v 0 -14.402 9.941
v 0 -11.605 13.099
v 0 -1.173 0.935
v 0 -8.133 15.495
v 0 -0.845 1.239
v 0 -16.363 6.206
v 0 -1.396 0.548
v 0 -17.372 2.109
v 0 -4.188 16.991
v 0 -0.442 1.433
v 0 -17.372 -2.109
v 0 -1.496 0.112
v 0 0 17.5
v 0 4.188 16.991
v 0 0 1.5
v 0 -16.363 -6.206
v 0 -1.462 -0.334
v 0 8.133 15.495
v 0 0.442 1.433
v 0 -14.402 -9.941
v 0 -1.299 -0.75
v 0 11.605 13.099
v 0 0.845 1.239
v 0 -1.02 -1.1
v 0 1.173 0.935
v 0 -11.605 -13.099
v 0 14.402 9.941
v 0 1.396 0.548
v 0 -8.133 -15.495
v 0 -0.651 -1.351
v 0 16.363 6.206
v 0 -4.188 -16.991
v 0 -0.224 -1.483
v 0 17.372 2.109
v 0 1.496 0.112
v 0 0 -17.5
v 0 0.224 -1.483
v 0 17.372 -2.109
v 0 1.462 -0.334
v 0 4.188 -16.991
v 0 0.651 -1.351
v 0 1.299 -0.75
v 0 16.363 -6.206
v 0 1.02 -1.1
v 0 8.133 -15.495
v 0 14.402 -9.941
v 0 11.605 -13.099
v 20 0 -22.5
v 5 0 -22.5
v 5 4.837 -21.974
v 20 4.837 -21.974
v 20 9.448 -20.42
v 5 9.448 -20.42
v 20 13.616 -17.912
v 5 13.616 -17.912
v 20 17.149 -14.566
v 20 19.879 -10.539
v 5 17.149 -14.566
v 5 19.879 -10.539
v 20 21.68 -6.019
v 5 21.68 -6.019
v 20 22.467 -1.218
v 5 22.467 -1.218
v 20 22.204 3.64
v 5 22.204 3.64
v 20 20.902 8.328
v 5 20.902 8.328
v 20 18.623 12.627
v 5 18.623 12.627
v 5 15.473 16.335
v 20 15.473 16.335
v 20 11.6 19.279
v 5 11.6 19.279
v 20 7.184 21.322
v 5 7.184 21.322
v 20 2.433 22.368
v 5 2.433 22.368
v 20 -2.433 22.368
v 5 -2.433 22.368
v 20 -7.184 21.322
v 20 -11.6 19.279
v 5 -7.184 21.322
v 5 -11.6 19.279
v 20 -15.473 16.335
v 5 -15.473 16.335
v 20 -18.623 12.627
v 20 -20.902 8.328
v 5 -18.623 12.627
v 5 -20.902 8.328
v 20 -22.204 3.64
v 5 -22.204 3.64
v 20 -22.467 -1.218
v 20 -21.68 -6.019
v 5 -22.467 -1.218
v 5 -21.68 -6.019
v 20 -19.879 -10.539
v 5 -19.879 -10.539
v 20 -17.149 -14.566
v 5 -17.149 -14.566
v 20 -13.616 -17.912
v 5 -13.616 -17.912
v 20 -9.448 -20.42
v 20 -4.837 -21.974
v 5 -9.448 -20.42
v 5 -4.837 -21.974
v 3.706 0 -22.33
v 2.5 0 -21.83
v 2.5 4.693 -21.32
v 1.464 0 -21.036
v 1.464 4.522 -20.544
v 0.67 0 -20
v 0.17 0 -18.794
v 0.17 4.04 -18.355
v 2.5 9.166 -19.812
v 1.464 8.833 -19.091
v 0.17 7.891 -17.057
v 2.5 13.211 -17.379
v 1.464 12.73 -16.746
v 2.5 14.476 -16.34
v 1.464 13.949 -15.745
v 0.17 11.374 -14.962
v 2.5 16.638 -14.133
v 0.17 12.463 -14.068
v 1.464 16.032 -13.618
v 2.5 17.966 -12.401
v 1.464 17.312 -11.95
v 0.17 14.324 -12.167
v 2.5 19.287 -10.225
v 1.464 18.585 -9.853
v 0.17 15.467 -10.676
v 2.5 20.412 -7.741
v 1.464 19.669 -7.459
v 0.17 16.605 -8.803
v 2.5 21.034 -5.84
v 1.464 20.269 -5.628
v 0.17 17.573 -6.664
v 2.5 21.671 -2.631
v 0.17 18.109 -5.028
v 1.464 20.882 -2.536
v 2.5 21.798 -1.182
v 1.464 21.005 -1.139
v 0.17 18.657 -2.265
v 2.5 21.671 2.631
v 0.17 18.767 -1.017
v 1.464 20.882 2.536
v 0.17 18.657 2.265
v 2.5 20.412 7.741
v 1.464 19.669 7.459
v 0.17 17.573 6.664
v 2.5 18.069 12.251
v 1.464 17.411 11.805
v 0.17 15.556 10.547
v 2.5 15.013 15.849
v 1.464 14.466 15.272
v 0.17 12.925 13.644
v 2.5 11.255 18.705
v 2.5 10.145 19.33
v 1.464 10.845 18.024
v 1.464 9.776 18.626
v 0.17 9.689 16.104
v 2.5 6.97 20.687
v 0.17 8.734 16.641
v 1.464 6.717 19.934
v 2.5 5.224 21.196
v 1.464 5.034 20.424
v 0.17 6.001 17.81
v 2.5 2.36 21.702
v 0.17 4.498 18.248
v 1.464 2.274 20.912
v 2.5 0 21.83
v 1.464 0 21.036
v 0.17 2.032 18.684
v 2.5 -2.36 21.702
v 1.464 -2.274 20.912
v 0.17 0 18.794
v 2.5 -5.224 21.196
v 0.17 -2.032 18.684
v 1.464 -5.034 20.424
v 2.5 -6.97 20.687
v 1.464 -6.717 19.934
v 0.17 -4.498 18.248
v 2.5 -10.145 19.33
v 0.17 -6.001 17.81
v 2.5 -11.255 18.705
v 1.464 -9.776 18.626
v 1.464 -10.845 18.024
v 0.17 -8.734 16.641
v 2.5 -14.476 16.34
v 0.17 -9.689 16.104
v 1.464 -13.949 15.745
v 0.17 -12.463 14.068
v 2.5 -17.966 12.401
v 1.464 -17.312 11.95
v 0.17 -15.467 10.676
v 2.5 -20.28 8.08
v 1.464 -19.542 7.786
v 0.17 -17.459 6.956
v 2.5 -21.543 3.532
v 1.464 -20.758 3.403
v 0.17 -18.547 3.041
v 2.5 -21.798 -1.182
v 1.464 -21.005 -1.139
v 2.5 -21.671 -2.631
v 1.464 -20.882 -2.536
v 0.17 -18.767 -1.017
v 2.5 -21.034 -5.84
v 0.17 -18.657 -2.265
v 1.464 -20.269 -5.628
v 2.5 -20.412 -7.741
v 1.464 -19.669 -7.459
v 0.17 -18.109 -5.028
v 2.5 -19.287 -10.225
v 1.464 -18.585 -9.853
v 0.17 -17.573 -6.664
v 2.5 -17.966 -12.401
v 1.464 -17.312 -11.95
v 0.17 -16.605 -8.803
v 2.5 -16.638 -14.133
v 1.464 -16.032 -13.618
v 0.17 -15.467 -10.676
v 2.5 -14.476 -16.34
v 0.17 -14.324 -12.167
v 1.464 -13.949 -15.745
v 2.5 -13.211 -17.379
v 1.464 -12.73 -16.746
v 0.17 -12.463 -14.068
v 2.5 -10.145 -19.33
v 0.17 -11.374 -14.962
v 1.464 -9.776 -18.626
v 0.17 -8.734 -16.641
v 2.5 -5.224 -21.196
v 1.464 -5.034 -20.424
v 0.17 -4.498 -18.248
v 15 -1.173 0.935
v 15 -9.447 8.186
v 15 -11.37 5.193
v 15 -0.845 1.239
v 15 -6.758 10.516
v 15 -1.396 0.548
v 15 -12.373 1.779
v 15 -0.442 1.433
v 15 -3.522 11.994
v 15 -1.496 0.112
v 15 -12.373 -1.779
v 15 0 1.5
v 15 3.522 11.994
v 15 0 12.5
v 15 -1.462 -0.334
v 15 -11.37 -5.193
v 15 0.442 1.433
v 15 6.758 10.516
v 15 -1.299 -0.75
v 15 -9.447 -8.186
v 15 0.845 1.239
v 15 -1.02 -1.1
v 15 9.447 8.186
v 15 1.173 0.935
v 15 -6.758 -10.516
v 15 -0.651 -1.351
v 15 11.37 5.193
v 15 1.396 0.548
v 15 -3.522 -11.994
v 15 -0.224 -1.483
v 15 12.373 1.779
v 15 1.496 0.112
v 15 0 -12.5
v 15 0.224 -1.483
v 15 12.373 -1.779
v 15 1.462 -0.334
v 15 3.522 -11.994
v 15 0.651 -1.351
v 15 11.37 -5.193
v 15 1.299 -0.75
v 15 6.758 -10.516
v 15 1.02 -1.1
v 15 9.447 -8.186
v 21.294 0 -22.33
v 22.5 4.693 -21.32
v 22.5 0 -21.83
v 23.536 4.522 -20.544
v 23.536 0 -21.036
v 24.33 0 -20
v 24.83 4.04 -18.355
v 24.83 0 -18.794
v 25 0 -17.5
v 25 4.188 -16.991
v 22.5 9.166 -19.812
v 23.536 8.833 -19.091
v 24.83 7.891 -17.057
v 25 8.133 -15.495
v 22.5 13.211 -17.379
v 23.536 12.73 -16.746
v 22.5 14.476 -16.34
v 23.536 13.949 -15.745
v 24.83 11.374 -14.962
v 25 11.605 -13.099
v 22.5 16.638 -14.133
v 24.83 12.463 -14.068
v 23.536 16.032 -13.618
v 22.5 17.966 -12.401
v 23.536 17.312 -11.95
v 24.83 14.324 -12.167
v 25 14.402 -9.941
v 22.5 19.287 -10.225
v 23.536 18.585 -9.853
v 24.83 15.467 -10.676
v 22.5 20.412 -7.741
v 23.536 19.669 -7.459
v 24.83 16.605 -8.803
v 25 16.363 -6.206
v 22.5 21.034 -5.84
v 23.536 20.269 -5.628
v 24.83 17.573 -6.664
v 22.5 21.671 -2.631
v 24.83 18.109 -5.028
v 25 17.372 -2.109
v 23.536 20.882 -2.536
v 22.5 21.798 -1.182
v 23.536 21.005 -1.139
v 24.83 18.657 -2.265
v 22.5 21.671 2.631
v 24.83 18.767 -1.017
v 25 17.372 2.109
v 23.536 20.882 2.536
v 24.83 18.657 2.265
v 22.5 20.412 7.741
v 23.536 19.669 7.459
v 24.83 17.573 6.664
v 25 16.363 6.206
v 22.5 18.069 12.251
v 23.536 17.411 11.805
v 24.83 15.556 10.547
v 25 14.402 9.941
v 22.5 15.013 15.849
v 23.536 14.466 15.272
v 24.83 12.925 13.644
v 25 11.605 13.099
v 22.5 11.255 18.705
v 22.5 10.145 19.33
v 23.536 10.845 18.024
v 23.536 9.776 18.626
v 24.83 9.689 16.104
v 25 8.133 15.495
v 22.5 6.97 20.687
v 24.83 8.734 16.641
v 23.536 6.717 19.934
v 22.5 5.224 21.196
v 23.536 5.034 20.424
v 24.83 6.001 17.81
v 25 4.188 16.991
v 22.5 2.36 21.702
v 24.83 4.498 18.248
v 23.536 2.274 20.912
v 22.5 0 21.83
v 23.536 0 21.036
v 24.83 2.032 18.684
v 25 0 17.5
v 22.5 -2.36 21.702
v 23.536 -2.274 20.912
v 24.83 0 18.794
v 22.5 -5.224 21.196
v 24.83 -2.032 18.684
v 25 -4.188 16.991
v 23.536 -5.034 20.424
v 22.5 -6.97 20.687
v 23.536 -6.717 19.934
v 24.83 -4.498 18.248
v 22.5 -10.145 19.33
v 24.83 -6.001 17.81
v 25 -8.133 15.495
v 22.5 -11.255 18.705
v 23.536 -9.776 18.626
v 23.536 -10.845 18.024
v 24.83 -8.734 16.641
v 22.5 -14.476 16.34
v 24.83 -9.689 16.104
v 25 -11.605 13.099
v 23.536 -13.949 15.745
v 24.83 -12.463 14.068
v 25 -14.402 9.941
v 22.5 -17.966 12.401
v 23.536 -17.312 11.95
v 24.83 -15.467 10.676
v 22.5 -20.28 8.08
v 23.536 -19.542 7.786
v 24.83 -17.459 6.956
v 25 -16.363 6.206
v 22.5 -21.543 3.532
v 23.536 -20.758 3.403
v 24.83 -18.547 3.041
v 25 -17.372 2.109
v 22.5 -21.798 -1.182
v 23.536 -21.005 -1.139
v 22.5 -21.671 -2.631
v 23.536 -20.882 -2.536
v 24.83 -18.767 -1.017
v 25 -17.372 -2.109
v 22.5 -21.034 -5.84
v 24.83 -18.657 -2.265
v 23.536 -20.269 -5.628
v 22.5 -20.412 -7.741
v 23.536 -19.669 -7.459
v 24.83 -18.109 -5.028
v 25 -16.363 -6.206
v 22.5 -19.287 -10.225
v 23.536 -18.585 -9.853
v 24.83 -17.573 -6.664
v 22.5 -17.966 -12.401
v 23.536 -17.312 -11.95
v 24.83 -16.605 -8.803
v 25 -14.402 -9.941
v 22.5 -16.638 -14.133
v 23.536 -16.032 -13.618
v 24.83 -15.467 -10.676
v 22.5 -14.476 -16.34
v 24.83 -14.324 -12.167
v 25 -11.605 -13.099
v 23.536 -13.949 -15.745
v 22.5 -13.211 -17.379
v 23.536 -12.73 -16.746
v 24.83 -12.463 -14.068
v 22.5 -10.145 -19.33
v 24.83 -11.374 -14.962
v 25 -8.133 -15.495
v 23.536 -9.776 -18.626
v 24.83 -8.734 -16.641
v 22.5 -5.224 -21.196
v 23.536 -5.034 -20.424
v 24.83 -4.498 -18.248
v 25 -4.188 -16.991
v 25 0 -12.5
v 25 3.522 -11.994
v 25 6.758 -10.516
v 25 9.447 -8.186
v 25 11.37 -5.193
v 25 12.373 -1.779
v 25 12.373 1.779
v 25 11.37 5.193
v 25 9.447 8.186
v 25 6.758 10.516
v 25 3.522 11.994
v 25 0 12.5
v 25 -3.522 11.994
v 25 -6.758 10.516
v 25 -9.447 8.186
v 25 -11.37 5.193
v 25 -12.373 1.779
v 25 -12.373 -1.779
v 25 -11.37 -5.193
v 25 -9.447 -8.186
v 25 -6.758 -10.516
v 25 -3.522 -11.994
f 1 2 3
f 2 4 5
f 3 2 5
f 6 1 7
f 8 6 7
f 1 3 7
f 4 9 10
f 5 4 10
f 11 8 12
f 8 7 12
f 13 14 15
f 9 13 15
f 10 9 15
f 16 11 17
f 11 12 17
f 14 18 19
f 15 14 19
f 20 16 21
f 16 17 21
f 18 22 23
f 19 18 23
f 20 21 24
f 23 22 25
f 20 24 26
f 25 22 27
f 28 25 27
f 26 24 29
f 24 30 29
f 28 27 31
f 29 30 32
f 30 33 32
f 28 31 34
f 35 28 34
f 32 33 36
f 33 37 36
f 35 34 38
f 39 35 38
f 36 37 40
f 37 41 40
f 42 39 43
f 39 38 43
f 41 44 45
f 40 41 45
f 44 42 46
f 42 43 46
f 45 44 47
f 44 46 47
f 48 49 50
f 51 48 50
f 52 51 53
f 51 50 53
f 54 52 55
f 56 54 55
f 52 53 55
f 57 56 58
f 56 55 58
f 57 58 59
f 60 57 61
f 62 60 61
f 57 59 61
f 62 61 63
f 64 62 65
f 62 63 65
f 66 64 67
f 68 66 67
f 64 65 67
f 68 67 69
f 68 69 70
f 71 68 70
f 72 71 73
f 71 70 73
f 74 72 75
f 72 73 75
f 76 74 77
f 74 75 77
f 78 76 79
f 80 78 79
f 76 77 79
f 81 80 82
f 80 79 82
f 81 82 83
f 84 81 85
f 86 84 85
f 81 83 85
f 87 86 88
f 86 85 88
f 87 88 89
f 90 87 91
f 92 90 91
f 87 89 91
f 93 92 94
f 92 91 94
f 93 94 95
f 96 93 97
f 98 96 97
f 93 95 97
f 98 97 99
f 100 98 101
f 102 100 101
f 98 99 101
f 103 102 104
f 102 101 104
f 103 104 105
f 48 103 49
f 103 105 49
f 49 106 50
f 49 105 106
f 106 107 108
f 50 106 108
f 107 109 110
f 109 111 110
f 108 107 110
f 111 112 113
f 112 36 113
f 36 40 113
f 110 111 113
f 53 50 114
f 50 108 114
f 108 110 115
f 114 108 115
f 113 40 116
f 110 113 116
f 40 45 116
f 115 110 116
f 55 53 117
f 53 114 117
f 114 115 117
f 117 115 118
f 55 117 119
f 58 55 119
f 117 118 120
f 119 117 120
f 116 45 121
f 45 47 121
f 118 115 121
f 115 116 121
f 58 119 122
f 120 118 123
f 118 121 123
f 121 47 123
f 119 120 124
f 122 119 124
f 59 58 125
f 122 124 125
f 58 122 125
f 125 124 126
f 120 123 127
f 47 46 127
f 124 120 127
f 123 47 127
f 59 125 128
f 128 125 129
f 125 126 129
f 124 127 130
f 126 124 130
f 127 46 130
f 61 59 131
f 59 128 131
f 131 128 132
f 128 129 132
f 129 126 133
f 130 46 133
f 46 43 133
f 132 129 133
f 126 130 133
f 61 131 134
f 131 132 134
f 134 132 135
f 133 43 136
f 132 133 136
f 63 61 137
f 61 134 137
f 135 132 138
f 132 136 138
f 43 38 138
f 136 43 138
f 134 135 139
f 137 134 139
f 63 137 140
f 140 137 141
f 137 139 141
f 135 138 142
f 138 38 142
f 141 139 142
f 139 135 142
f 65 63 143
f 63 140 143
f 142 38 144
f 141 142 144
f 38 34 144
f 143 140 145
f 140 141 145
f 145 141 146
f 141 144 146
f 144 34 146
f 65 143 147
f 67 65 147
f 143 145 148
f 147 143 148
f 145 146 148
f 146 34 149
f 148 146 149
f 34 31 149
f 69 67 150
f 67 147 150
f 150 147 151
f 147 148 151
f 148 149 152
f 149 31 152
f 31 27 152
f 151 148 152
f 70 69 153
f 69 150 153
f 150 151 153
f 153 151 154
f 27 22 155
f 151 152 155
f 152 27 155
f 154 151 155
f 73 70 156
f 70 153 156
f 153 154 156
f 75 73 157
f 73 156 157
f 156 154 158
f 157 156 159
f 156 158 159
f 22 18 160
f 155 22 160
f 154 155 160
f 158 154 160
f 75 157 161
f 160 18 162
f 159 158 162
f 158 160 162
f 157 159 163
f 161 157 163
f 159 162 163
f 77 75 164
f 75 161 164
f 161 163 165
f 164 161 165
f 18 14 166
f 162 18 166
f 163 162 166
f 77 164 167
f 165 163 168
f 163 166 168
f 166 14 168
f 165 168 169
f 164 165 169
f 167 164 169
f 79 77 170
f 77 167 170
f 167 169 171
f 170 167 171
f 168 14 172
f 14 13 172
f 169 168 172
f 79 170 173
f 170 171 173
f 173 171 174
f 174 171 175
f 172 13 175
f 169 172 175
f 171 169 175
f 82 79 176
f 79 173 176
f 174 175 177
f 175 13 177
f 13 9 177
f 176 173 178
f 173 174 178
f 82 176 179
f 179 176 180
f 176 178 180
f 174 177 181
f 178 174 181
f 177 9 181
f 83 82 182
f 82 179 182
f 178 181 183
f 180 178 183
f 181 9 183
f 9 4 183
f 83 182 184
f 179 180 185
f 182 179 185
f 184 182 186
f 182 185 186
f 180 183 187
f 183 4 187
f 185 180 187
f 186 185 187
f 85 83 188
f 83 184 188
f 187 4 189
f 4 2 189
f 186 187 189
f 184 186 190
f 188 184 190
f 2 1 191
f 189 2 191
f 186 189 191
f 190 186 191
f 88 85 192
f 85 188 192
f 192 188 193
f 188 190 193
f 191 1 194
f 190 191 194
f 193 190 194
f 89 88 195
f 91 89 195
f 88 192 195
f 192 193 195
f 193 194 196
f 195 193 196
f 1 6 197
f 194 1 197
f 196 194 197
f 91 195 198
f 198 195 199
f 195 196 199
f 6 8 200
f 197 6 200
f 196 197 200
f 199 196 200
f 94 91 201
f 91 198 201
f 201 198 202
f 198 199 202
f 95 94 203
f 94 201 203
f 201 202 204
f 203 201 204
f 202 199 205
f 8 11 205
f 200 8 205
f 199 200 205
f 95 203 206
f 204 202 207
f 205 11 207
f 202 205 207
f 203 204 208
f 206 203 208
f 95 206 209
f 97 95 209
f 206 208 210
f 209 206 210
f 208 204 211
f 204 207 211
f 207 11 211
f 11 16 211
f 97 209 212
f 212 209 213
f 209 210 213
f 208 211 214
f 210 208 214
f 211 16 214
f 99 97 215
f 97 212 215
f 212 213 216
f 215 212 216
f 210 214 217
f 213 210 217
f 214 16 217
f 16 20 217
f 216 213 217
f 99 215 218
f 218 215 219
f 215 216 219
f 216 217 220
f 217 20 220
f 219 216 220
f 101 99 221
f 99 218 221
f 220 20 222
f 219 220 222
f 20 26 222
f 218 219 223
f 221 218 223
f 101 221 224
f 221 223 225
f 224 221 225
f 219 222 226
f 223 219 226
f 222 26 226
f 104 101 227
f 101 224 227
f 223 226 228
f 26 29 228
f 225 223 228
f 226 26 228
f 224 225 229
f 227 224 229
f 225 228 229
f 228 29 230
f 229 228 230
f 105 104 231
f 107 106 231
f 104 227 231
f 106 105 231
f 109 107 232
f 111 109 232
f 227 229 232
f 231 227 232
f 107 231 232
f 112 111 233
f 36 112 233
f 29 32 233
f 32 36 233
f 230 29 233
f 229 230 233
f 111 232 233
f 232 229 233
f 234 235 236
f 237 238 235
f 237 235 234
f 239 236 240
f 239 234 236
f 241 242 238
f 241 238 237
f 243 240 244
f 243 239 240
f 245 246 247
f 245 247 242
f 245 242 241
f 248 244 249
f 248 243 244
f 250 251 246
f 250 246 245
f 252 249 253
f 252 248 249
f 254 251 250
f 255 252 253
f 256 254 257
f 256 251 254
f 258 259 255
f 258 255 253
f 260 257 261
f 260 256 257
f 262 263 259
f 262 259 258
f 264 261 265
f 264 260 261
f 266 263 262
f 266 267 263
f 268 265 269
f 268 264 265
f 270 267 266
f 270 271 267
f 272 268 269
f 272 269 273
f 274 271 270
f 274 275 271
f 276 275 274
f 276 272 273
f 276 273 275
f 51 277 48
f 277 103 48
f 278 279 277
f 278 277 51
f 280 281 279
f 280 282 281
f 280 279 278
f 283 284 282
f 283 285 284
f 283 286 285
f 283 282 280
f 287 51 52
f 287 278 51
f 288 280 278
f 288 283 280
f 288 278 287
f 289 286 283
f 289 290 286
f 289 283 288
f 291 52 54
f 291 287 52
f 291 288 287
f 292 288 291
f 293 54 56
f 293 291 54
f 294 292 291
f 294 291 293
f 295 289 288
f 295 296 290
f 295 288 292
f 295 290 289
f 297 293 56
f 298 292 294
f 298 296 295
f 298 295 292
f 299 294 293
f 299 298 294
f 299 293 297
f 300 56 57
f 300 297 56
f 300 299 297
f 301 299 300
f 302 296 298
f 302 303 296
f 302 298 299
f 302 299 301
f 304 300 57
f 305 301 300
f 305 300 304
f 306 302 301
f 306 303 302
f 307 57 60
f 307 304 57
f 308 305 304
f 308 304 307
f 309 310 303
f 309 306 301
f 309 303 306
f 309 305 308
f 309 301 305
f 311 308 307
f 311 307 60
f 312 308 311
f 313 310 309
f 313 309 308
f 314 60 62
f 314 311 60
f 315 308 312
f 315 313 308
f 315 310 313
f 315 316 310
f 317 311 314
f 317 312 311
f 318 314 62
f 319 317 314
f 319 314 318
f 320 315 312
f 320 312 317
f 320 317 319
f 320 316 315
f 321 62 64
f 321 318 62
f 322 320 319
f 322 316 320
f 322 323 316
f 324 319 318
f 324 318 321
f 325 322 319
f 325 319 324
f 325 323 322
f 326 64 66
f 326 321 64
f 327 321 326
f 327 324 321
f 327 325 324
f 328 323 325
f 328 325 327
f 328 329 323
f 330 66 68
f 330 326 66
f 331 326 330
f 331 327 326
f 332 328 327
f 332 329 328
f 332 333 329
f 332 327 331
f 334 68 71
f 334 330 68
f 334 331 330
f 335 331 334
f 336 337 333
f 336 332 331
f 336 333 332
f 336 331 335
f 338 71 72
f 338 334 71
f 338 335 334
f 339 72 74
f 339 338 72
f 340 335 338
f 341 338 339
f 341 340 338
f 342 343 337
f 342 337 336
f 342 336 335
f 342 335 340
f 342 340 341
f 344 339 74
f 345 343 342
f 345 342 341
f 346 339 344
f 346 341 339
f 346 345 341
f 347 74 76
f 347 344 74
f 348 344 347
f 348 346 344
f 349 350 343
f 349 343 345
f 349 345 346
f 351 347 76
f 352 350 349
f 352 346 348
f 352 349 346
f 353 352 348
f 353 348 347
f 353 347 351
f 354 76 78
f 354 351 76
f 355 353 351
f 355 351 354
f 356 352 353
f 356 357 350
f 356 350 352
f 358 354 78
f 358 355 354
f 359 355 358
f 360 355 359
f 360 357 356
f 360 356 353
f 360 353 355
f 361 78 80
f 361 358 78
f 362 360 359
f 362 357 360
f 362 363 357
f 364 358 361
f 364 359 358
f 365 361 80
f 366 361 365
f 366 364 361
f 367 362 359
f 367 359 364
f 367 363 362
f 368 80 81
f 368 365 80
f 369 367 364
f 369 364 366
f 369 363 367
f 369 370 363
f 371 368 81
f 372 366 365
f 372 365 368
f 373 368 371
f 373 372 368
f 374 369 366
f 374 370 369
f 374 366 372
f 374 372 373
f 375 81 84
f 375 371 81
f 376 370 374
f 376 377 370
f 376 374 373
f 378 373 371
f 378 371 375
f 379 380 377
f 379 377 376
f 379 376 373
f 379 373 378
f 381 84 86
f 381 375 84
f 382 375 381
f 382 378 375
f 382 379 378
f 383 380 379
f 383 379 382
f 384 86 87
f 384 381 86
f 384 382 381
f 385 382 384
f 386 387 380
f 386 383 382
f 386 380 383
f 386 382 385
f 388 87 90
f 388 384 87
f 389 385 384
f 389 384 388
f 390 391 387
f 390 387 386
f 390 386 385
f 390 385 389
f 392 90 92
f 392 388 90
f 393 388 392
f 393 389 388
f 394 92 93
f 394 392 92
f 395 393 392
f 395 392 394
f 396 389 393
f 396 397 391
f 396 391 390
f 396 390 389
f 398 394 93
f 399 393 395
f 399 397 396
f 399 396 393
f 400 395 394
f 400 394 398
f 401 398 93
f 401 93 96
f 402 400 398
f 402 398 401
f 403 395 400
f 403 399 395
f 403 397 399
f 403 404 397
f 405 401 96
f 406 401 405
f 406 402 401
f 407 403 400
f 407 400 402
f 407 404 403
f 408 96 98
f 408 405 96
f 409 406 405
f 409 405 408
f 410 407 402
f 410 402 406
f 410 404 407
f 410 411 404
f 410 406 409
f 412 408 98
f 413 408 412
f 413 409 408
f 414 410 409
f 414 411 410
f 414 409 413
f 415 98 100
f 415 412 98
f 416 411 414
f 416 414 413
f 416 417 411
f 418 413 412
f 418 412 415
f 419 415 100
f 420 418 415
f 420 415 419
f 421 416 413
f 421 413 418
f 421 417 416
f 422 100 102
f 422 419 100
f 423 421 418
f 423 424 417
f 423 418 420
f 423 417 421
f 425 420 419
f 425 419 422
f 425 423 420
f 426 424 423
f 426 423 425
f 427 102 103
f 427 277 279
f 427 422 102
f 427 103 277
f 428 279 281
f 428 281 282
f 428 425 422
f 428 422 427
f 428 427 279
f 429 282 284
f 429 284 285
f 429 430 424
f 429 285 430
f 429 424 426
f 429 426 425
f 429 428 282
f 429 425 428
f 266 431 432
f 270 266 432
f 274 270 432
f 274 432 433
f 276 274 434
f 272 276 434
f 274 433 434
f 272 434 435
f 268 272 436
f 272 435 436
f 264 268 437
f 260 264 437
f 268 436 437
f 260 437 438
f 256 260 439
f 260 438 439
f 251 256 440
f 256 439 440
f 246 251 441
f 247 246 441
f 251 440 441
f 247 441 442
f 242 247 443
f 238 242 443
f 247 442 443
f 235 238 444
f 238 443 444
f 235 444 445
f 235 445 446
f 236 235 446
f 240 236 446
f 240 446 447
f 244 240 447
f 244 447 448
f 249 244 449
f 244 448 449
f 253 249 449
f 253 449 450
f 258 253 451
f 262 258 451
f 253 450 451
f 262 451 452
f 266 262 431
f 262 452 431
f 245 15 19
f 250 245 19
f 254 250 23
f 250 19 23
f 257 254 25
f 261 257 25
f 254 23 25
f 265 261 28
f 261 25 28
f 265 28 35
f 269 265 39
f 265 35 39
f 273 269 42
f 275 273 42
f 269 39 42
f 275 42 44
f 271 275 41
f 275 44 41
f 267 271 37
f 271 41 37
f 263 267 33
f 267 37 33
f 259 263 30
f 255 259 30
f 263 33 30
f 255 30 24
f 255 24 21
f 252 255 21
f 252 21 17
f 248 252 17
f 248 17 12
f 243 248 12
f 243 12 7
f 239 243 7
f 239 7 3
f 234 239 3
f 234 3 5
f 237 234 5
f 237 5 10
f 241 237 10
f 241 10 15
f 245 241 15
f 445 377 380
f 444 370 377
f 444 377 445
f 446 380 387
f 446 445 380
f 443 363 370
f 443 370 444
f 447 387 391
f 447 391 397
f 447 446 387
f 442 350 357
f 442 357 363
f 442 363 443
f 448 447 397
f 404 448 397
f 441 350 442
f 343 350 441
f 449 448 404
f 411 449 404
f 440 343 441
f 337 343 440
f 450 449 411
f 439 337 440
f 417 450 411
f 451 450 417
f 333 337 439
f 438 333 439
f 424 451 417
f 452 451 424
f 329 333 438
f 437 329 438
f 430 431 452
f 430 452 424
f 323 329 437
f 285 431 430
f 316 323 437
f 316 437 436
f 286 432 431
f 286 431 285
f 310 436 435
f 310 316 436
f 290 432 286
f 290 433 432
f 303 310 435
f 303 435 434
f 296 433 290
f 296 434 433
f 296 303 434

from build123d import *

# Parameters (mm, degrees)
SKETCH1_R           = 22.5
BOSS_EXTRUDE1_DEPTH = 25
SKETCH2_R           = 12.5
CUT_EXTRUDE1_DEPTH  = 10
FILLET1_R           = 5
SKETCH3_R           = 1.5
CUT_EXTRUDE2_DEPTH  = 41.466035196


with BuildPart() as part:
    # Sketch1 → Boss-Extrude1 (new body)
    with BuildSketch(Plane(origin=(0, 0, 0), x_dir=(0, 0, -1), z_dir=(1, 0, 0))):
        Circle(SKETCH1_R)
    extrude(amount=BOSS_EXTRUDE1_DEPTH)

    # Sketch2 → Cut-Extrude1 (cut)
    with BuildSketch(Plane(origin=(25, 0, 0), x_dir=(0, 0, -1), z_dir=(1, 0, 0))):
        Circle(SKETCH2_R)
    extrude(amount=-CUT_EXTRUDE1_DEPTH, mode=Mode.SUBTRACT)

    # Fillet1
    fillet1_edges = [part.edges().sort_by_distance(p)[0] for p in [
        (0, 0, 22.5),
        (25, 0, 22.5),
    ]]
    fillet(fillet1_edges, radius=FILLET1_R)

    # Sketch3 → Cut-Extrude2 (cut, through all)
    with BuildSketch(Plane.ZY):
        Circle(SKETCH3_R)
    extrude(amount=-CUT_EXTRUDE2_DEPTH, mode=Mode.SUBTRACT)


solid = part.part
